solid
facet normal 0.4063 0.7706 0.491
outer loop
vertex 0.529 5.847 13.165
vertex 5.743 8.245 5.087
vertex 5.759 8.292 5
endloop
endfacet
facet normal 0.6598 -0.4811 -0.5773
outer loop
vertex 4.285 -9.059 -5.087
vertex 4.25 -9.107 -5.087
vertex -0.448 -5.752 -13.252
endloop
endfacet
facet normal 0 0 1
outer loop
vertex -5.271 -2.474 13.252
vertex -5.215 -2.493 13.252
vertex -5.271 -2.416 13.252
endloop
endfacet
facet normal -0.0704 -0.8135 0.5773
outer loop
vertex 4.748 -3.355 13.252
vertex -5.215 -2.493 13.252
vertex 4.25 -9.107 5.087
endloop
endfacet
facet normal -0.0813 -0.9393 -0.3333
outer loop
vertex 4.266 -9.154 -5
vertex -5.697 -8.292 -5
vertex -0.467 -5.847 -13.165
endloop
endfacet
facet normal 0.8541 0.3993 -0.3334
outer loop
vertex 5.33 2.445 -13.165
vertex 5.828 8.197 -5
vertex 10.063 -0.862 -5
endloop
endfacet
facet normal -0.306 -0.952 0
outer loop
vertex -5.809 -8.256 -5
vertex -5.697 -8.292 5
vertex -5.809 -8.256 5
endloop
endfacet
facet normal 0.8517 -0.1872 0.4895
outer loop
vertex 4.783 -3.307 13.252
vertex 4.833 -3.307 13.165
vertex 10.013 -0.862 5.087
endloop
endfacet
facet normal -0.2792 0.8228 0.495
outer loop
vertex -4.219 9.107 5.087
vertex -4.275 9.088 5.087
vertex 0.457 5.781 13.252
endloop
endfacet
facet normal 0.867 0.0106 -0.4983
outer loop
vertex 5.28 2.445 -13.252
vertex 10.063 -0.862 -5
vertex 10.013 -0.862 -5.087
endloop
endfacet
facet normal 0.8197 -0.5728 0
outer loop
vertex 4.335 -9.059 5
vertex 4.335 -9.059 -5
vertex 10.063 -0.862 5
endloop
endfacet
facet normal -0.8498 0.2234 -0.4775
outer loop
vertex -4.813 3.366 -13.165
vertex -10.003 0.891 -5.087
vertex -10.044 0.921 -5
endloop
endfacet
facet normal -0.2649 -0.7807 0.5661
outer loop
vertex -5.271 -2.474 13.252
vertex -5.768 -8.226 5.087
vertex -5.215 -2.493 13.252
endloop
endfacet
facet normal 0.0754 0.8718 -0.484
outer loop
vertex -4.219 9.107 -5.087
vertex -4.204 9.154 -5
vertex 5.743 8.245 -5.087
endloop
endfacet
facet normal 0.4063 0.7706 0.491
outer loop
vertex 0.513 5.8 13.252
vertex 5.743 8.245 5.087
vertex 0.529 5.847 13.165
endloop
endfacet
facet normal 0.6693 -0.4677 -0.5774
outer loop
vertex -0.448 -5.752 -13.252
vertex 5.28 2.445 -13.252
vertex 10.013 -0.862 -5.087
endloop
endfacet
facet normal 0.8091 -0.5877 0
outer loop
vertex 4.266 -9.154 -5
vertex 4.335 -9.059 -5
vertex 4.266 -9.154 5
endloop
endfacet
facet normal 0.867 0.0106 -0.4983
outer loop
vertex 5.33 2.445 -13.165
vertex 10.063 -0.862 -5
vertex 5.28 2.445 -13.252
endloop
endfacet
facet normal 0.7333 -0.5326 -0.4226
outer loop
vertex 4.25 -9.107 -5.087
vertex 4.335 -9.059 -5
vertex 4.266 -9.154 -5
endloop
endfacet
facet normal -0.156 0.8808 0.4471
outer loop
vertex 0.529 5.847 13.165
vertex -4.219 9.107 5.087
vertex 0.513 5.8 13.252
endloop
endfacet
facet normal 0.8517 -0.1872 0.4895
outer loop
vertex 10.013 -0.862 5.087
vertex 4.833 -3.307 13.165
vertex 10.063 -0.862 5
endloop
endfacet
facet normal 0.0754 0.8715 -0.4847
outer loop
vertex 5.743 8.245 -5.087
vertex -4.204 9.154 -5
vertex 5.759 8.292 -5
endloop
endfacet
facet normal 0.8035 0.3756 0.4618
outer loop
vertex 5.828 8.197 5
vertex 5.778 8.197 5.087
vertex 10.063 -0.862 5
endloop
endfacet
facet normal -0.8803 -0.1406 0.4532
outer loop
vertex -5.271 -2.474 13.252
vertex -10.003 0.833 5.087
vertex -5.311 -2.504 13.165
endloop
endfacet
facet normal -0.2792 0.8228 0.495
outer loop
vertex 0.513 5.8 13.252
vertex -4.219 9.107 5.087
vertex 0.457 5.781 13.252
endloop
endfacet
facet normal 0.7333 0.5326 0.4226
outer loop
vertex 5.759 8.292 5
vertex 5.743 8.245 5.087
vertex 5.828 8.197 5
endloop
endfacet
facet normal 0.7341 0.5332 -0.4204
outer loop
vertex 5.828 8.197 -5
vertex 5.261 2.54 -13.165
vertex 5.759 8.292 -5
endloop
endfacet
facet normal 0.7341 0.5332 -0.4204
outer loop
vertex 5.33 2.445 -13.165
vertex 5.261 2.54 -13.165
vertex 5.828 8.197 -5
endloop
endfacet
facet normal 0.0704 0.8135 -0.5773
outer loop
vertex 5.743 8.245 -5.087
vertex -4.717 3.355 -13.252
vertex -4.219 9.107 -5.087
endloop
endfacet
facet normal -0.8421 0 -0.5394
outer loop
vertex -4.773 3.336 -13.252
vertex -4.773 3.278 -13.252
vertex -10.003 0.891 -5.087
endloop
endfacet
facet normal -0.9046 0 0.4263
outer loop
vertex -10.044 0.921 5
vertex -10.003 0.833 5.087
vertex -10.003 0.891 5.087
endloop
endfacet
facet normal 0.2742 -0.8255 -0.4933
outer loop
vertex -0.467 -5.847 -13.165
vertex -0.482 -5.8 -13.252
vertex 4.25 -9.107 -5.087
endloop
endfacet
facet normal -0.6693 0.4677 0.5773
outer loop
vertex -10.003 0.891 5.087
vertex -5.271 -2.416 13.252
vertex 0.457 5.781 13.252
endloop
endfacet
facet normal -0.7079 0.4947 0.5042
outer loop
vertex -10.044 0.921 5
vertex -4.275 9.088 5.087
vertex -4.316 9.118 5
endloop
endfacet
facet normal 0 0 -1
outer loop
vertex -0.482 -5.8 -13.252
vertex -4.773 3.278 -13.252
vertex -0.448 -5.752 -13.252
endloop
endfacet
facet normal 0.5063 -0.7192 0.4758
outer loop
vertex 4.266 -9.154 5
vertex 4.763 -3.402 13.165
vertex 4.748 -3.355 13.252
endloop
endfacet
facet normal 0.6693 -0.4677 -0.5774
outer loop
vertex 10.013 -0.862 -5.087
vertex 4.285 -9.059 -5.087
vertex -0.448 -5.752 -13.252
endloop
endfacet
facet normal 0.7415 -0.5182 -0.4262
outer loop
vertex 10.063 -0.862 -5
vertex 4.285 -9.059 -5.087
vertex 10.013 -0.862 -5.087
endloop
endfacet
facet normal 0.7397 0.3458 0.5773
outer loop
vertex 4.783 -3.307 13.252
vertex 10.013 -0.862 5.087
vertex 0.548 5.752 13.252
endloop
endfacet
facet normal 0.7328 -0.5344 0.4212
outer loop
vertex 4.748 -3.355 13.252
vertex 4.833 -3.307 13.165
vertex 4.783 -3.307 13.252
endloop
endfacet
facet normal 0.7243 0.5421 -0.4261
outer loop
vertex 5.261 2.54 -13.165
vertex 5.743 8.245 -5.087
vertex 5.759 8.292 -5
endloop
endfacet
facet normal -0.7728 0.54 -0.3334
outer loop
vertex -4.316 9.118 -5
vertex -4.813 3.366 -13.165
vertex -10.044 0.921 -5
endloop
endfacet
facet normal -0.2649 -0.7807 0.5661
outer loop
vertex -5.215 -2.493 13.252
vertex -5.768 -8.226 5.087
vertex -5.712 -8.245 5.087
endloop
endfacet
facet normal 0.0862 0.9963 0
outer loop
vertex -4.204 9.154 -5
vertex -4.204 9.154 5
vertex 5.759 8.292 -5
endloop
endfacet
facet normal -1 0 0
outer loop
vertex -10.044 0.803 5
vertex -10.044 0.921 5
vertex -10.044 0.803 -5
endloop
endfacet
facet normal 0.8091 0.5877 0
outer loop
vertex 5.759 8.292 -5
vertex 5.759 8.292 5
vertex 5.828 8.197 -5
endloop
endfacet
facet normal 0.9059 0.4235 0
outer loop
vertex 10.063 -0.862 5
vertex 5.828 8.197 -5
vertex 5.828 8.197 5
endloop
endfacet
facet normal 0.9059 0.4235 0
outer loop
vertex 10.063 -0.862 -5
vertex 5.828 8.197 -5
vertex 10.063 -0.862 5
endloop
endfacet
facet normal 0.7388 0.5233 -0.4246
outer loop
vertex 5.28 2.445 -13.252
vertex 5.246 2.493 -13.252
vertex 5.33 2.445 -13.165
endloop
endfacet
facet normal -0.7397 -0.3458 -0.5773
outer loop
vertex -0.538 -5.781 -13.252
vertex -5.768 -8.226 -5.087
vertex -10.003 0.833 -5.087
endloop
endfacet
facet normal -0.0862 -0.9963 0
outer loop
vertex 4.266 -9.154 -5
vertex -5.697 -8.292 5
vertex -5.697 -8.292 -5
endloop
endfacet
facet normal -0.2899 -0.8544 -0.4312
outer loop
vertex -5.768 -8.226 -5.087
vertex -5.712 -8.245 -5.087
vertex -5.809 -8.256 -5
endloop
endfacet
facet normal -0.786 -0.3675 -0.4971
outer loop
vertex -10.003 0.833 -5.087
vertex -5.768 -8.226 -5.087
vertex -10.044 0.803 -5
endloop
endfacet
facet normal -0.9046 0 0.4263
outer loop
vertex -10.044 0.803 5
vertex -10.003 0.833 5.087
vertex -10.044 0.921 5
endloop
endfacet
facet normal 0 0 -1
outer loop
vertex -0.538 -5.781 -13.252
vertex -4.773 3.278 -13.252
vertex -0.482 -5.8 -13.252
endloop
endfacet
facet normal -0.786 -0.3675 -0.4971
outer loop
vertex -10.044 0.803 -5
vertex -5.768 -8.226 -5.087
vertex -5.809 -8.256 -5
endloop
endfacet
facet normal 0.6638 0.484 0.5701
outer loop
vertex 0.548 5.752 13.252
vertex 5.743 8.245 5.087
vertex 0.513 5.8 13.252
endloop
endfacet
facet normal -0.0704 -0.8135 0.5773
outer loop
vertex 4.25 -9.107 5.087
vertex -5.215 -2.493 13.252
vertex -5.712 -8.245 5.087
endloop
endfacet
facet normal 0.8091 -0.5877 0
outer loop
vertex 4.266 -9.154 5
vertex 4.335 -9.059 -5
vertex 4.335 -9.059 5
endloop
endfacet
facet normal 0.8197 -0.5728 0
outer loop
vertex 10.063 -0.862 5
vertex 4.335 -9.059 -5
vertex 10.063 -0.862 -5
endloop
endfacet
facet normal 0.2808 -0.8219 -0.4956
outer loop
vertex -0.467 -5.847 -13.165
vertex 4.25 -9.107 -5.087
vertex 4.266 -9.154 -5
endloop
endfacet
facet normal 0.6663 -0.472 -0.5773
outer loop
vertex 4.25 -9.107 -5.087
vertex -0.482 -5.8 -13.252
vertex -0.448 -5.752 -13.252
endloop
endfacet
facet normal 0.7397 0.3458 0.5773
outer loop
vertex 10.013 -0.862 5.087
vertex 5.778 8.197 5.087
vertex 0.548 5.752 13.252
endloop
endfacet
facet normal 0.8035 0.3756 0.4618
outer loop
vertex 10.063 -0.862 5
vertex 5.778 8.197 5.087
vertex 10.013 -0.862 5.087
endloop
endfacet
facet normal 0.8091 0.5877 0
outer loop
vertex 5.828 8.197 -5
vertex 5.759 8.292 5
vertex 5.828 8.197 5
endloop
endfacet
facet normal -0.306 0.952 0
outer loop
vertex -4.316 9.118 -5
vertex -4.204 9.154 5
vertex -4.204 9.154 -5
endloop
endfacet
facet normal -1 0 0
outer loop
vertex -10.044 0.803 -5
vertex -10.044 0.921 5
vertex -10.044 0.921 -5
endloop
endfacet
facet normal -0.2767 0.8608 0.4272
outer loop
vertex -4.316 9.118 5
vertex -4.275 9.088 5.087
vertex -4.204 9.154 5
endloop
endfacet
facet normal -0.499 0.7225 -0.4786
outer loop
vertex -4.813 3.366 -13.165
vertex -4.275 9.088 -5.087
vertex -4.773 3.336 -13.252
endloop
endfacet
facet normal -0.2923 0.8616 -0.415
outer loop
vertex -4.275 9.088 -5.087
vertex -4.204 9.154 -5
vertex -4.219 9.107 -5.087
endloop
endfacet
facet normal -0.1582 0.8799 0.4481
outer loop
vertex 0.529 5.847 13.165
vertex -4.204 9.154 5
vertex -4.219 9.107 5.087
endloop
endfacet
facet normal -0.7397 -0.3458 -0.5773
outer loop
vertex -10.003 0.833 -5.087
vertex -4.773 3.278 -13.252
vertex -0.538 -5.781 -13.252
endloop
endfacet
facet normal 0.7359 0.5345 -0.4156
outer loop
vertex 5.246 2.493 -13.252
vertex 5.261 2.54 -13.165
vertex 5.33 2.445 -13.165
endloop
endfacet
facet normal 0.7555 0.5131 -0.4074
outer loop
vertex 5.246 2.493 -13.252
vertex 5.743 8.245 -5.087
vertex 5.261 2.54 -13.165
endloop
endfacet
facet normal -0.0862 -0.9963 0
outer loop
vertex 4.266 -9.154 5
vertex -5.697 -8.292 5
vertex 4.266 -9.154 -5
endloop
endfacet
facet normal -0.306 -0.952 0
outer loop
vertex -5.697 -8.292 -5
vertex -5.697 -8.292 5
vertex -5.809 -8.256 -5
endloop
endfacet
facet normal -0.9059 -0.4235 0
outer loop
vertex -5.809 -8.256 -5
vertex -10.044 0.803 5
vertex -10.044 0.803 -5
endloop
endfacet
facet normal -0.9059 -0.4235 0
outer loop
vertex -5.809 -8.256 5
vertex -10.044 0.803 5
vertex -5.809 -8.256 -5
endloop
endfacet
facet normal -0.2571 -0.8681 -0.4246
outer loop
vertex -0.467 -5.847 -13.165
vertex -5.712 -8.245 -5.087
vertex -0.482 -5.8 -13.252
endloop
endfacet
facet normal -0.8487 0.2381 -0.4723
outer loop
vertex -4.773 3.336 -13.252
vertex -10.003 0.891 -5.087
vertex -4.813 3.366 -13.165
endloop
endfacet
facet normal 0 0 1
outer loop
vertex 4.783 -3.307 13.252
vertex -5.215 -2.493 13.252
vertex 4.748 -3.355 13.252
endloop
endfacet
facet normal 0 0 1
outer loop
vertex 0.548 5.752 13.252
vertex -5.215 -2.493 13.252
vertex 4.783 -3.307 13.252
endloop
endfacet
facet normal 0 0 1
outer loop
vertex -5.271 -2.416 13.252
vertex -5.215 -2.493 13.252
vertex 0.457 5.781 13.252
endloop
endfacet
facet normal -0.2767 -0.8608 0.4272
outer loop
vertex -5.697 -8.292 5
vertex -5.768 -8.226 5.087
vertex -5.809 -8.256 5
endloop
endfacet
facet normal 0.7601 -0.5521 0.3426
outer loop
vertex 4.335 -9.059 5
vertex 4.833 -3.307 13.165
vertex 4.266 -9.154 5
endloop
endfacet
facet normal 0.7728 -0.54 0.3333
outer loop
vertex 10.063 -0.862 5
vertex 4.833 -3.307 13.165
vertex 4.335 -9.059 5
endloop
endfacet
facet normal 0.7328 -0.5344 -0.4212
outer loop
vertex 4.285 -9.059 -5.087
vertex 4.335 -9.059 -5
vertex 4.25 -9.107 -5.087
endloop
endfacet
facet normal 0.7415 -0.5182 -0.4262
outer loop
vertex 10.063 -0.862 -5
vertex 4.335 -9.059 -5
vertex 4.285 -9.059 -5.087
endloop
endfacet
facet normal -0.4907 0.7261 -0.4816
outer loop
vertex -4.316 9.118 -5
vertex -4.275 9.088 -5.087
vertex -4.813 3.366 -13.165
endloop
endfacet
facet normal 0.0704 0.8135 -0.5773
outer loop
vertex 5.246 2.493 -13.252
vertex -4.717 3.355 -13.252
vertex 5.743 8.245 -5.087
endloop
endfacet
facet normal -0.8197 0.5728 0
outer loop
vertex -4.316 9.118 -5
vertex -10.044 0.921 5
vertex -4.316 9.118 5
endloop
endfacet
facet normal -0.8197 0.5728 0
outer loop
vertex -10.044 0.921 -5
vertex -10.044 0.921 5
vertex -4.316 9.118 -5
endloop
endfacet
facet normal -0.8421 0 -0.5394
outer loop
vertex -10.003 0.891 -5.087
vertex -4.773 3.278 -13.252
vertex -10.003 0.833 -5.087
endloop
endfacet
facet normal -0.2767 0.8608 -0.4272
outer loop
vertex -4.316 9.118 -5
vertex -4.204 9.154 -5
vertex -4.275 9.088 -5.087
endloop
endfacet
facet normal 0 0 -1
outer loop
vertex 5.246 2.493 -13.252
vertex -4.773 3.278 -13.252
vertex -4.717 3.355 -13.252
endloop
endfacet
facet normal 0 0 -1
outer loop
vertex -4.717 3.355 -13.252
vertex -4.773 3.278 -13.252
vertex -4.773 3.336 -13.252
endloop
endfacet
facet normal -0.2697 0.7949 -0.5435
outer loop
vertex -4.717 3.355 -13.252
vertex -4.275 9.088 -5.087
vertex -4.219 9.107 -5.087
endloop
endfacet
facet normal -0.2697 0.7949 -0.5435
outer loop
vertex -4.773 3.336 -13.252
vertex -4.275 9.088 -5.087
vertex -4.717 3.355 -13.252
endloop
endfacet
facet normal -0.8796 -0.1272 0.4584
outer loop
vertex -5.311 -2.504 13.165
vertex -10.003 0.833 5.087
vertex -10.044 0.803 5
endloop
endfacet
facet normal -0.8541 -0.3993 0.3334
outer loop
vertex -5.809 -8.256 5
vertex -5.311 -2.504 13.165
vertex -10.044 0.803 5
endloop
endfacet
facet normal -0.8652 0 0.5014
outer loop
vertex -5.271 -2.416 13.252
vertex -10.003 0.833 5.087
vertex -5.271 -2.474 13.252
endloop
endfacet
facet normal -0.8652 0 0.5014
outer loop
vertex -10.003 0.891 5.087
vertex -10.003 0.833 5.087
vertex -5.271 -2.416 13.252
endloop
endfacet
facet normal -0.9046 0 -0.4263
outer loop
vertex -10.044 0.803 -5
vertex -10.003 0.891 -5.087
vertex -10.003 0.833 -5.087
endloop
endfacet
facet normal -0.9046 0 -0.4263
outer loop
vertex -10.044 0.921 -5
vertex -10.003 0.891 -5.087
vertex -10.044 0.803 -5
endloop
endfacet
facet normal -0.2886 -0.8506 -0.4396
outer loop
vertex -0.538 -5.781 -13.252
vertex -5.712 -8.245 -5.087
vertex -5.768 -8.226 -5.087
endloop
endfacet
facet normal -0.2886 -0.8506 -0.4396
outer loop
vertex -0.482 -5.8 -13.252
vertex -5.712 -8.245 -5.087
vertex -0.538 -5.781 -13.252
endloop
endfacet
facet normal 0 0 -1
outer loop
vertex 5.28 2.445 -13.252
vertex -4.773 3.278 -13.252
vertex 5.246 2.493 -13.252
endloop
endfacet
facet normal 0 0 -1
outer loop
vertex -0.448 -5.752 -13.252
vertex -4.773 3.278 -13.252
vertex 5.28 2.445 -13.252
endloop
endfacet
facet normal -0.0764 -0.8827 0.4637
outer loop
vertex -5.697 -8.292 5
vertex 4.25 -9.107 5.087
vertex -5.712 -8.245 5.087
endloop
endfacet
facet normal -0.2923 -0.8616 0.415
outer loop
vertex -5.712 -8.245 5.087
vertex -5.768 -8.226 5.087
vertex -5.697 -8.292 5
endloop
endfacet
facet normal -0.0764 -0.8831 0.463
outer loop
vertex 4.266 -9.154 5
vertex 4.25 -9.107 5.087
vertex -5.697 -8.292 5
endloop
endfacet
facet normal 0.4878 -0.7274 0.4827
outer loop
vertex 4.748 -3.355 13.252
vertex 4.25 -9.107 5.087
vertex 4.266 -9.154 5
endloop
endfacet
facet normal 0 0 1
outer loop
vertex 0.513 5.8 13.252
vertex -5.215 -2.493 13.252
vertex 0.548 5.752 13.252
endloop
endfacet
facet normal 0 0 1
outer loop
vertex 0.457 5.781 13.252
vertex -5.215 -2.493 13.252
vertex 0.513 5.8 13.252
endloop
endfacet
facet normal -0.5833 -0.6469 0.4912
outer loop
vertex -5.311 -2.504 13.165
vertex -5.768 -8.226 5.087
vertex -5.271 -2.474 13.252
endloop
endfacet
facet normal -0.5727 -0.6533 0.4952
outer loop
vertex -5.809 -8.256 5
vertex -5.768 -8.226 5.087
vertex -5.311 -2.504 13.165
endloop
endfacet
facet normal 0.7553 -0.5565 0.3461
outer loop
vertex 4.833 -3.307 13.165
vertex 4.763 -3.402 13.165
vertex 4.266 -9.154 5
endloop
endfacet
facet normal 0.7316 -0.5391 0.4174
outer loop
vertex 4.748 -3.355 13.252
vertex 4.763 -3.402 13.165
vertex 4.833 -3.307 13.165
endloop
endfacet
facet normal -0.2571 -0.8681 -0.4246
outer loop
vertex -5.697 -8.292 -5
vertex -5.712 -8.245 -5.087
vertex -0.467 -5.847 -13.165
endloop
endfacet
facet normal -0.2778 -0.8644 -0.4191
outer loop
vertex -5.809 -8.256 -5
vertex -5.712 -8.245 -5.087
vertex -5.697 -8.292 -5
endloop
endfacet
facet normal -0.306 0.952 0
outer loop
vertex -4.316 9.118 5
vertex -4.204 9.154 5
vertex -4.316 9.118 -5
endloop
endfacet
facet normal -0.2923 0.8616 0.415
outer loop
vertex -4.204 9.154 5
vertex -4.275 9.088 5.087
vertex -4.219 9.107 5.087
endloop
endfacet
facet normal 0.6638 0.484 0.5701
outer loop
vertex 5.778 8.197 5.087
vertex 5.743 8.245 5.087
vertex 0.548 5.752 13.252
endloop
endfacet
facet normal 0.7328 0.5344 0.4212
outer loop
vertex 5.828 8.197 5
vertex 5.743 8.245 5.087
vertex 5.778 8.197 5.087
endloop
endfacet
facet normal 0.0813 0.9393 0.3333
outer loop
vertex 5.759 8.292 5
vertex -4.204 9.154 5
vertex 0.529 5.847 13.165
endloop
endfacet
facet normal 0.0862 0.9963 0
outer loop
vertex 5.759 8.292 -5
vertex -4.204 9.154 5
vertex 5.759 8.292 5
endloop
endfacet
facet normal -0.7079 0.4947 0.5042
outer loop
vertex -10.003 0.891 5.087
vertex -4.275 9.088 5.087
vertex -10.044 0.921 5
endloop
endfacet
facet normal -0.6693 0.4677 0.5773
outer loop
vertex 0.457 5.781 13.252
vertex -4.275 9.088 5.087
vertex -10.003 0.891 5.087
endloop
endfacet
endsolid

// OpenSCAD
// Auto-generated OpenSCAD file

    inner_points = 10*[[-0.5727942453287636, -0.8196991841635889, -0.49999999999979927], [0.572794245328764, 0.8196991841635887, 0.49999999999979927], [0.4234831942827272, -0.9059039596778707, 0.5000000000000533], [-0.42348319428272685, 0.9059039596778705, -0.5000000000000533], [0.9962774396112515, -0.08620477551448197, -0.5000000000001475], [-0.996277439611251, 0.08620477551448175, 0.5000000000001475], [0.9962774396114111, -0.08620477551434857, 0.49999999999985245], [-0.9962774396114107, 0.08620477551434835, -0.49999999999985245], [0.5727942453286043, 0.8196991841634554, -0.5000000000002008], [-0.5727942453286039, -0.8196991841634557, 0.5000000000002008], [0.42348319428256764, -0.905903959678004, -0.4999999999999469], [-0.4234831942825673, 0.9059039596780037, 0.4999999999999469], [0.5230238949797952, 0.24449813621619343, -1.3164965809278422], [-0.5230238949797947, -0.24449813621619365, 1.3164965809278422], [-0.049770350348888805, -0.5752010479473287, -1.3164965809276414], [0.04977035034888918, 0.5752010479473285, 1.3164965809276414], [-0.47325354463153607, 0.33070291173060856, -1.3164965809276947], [0.4732535446315364, -0.3307029117306088, 1.3164965809276947]];

    outer_points = 10*[[0.5298790273108971, -0.49733729572507634, -0.8496374701582584], [-0.5298790273108971, 0.49733729572507634, 0.8496374701582584], [-0.5206247255916664, -0.9885998081008317, -0.040253130631053124], [0.5206247255916664, 0.9885998081008317, 0.040253130631053124], [0.44745605235875646, -0.5243669819275101, 0.8802399385802442], [-0.44745605235875646, 0.5243669819275101, -0.8802399385802442], [-0.5511838178154568, -0.5022973355596736, 0.833002872544885], [0.5511838178154568, 0.5022973355596736, -0.833002872544885], [0.46876084286331626, 0.47526764935724, 0.8968745361936177], [-0.46876084286331626, -0.47526764935724, -0.8968745361936177], [0.4780151445825469, -1.010669454468668, 0.006983935404306196], [-0.4780151445825469, 1.010669454468668, -0.006983935404306196], [1.287231649678413, -0.038064509386351864, 0.6388132388414419], [-1.287231649678413, 0.038064509386351864, -0.6388132388414419], [1.3177907419022037, -0.5243669819275101, -0.23444276433449618], [-1.3177907419022037, 0.5243669819275101, 0.23444276433449618], [1.3390955324067635, 0.47526764935724, -0.2178081667211227], [-1.3390955324067635, -0.47526764935724, 0.2178081667211227]];

    // Convex hull for inner set (I)
    module inner_hull() {
        hull() {
            for (p = inner_points) {
                translate(p) sphere(r=0.1);
            }
        }
    }

    // Convex hull for outer set (O) minus inner hull (O \ I)
    module outer_minus_inner() {
        difference() {
            hull() {
                for (p = outer_points) {
                    translate(p) sphere(r=0.1);
                }
            }
            inner_hull(); // Subtract inner hull
        }
    }

    // Convex hull for outer set (O) minus all translated inner hulls
    module outer_minus_AllTranslationInner() {
        difference() {
            hull() {
                for (p = outer_points) {
                    translate(p) sphere(r=0.1);
                }
            }
            hull() {
                translate([0,0,50]) inner_hull();
                translate([0,0,-50]) inner_hull();
            }; // Subtract translated inner hulls
        }
    }

    // Difference between outer_minus_inner and outer_minus_AllTranslationInner
    module outer_minus_inner_diff() {
        difference() {
            // Outer minus inner
            difference() {
                hull() {
                    for (p = outer_points) {
                        translate(p) sphere(r=0.1);
                    }
                }
                inner_hull();
            }

            // Subtract Outer minus AllTranslationInner
            difference() {
                hull() {
                    for (p = outer_points) {
                        translate(p) sphere(r=0.1);
                    }
                }
                hull() {
                    translate([0,0,50]) inner_hull();
                    translate([0,0,-50]) inner_hull();
                };
            }
        }
    }

    // Rendering all with colors applied
    color([1, 0, 0, 0.5]) inner_hull(); // Transparent red
    
